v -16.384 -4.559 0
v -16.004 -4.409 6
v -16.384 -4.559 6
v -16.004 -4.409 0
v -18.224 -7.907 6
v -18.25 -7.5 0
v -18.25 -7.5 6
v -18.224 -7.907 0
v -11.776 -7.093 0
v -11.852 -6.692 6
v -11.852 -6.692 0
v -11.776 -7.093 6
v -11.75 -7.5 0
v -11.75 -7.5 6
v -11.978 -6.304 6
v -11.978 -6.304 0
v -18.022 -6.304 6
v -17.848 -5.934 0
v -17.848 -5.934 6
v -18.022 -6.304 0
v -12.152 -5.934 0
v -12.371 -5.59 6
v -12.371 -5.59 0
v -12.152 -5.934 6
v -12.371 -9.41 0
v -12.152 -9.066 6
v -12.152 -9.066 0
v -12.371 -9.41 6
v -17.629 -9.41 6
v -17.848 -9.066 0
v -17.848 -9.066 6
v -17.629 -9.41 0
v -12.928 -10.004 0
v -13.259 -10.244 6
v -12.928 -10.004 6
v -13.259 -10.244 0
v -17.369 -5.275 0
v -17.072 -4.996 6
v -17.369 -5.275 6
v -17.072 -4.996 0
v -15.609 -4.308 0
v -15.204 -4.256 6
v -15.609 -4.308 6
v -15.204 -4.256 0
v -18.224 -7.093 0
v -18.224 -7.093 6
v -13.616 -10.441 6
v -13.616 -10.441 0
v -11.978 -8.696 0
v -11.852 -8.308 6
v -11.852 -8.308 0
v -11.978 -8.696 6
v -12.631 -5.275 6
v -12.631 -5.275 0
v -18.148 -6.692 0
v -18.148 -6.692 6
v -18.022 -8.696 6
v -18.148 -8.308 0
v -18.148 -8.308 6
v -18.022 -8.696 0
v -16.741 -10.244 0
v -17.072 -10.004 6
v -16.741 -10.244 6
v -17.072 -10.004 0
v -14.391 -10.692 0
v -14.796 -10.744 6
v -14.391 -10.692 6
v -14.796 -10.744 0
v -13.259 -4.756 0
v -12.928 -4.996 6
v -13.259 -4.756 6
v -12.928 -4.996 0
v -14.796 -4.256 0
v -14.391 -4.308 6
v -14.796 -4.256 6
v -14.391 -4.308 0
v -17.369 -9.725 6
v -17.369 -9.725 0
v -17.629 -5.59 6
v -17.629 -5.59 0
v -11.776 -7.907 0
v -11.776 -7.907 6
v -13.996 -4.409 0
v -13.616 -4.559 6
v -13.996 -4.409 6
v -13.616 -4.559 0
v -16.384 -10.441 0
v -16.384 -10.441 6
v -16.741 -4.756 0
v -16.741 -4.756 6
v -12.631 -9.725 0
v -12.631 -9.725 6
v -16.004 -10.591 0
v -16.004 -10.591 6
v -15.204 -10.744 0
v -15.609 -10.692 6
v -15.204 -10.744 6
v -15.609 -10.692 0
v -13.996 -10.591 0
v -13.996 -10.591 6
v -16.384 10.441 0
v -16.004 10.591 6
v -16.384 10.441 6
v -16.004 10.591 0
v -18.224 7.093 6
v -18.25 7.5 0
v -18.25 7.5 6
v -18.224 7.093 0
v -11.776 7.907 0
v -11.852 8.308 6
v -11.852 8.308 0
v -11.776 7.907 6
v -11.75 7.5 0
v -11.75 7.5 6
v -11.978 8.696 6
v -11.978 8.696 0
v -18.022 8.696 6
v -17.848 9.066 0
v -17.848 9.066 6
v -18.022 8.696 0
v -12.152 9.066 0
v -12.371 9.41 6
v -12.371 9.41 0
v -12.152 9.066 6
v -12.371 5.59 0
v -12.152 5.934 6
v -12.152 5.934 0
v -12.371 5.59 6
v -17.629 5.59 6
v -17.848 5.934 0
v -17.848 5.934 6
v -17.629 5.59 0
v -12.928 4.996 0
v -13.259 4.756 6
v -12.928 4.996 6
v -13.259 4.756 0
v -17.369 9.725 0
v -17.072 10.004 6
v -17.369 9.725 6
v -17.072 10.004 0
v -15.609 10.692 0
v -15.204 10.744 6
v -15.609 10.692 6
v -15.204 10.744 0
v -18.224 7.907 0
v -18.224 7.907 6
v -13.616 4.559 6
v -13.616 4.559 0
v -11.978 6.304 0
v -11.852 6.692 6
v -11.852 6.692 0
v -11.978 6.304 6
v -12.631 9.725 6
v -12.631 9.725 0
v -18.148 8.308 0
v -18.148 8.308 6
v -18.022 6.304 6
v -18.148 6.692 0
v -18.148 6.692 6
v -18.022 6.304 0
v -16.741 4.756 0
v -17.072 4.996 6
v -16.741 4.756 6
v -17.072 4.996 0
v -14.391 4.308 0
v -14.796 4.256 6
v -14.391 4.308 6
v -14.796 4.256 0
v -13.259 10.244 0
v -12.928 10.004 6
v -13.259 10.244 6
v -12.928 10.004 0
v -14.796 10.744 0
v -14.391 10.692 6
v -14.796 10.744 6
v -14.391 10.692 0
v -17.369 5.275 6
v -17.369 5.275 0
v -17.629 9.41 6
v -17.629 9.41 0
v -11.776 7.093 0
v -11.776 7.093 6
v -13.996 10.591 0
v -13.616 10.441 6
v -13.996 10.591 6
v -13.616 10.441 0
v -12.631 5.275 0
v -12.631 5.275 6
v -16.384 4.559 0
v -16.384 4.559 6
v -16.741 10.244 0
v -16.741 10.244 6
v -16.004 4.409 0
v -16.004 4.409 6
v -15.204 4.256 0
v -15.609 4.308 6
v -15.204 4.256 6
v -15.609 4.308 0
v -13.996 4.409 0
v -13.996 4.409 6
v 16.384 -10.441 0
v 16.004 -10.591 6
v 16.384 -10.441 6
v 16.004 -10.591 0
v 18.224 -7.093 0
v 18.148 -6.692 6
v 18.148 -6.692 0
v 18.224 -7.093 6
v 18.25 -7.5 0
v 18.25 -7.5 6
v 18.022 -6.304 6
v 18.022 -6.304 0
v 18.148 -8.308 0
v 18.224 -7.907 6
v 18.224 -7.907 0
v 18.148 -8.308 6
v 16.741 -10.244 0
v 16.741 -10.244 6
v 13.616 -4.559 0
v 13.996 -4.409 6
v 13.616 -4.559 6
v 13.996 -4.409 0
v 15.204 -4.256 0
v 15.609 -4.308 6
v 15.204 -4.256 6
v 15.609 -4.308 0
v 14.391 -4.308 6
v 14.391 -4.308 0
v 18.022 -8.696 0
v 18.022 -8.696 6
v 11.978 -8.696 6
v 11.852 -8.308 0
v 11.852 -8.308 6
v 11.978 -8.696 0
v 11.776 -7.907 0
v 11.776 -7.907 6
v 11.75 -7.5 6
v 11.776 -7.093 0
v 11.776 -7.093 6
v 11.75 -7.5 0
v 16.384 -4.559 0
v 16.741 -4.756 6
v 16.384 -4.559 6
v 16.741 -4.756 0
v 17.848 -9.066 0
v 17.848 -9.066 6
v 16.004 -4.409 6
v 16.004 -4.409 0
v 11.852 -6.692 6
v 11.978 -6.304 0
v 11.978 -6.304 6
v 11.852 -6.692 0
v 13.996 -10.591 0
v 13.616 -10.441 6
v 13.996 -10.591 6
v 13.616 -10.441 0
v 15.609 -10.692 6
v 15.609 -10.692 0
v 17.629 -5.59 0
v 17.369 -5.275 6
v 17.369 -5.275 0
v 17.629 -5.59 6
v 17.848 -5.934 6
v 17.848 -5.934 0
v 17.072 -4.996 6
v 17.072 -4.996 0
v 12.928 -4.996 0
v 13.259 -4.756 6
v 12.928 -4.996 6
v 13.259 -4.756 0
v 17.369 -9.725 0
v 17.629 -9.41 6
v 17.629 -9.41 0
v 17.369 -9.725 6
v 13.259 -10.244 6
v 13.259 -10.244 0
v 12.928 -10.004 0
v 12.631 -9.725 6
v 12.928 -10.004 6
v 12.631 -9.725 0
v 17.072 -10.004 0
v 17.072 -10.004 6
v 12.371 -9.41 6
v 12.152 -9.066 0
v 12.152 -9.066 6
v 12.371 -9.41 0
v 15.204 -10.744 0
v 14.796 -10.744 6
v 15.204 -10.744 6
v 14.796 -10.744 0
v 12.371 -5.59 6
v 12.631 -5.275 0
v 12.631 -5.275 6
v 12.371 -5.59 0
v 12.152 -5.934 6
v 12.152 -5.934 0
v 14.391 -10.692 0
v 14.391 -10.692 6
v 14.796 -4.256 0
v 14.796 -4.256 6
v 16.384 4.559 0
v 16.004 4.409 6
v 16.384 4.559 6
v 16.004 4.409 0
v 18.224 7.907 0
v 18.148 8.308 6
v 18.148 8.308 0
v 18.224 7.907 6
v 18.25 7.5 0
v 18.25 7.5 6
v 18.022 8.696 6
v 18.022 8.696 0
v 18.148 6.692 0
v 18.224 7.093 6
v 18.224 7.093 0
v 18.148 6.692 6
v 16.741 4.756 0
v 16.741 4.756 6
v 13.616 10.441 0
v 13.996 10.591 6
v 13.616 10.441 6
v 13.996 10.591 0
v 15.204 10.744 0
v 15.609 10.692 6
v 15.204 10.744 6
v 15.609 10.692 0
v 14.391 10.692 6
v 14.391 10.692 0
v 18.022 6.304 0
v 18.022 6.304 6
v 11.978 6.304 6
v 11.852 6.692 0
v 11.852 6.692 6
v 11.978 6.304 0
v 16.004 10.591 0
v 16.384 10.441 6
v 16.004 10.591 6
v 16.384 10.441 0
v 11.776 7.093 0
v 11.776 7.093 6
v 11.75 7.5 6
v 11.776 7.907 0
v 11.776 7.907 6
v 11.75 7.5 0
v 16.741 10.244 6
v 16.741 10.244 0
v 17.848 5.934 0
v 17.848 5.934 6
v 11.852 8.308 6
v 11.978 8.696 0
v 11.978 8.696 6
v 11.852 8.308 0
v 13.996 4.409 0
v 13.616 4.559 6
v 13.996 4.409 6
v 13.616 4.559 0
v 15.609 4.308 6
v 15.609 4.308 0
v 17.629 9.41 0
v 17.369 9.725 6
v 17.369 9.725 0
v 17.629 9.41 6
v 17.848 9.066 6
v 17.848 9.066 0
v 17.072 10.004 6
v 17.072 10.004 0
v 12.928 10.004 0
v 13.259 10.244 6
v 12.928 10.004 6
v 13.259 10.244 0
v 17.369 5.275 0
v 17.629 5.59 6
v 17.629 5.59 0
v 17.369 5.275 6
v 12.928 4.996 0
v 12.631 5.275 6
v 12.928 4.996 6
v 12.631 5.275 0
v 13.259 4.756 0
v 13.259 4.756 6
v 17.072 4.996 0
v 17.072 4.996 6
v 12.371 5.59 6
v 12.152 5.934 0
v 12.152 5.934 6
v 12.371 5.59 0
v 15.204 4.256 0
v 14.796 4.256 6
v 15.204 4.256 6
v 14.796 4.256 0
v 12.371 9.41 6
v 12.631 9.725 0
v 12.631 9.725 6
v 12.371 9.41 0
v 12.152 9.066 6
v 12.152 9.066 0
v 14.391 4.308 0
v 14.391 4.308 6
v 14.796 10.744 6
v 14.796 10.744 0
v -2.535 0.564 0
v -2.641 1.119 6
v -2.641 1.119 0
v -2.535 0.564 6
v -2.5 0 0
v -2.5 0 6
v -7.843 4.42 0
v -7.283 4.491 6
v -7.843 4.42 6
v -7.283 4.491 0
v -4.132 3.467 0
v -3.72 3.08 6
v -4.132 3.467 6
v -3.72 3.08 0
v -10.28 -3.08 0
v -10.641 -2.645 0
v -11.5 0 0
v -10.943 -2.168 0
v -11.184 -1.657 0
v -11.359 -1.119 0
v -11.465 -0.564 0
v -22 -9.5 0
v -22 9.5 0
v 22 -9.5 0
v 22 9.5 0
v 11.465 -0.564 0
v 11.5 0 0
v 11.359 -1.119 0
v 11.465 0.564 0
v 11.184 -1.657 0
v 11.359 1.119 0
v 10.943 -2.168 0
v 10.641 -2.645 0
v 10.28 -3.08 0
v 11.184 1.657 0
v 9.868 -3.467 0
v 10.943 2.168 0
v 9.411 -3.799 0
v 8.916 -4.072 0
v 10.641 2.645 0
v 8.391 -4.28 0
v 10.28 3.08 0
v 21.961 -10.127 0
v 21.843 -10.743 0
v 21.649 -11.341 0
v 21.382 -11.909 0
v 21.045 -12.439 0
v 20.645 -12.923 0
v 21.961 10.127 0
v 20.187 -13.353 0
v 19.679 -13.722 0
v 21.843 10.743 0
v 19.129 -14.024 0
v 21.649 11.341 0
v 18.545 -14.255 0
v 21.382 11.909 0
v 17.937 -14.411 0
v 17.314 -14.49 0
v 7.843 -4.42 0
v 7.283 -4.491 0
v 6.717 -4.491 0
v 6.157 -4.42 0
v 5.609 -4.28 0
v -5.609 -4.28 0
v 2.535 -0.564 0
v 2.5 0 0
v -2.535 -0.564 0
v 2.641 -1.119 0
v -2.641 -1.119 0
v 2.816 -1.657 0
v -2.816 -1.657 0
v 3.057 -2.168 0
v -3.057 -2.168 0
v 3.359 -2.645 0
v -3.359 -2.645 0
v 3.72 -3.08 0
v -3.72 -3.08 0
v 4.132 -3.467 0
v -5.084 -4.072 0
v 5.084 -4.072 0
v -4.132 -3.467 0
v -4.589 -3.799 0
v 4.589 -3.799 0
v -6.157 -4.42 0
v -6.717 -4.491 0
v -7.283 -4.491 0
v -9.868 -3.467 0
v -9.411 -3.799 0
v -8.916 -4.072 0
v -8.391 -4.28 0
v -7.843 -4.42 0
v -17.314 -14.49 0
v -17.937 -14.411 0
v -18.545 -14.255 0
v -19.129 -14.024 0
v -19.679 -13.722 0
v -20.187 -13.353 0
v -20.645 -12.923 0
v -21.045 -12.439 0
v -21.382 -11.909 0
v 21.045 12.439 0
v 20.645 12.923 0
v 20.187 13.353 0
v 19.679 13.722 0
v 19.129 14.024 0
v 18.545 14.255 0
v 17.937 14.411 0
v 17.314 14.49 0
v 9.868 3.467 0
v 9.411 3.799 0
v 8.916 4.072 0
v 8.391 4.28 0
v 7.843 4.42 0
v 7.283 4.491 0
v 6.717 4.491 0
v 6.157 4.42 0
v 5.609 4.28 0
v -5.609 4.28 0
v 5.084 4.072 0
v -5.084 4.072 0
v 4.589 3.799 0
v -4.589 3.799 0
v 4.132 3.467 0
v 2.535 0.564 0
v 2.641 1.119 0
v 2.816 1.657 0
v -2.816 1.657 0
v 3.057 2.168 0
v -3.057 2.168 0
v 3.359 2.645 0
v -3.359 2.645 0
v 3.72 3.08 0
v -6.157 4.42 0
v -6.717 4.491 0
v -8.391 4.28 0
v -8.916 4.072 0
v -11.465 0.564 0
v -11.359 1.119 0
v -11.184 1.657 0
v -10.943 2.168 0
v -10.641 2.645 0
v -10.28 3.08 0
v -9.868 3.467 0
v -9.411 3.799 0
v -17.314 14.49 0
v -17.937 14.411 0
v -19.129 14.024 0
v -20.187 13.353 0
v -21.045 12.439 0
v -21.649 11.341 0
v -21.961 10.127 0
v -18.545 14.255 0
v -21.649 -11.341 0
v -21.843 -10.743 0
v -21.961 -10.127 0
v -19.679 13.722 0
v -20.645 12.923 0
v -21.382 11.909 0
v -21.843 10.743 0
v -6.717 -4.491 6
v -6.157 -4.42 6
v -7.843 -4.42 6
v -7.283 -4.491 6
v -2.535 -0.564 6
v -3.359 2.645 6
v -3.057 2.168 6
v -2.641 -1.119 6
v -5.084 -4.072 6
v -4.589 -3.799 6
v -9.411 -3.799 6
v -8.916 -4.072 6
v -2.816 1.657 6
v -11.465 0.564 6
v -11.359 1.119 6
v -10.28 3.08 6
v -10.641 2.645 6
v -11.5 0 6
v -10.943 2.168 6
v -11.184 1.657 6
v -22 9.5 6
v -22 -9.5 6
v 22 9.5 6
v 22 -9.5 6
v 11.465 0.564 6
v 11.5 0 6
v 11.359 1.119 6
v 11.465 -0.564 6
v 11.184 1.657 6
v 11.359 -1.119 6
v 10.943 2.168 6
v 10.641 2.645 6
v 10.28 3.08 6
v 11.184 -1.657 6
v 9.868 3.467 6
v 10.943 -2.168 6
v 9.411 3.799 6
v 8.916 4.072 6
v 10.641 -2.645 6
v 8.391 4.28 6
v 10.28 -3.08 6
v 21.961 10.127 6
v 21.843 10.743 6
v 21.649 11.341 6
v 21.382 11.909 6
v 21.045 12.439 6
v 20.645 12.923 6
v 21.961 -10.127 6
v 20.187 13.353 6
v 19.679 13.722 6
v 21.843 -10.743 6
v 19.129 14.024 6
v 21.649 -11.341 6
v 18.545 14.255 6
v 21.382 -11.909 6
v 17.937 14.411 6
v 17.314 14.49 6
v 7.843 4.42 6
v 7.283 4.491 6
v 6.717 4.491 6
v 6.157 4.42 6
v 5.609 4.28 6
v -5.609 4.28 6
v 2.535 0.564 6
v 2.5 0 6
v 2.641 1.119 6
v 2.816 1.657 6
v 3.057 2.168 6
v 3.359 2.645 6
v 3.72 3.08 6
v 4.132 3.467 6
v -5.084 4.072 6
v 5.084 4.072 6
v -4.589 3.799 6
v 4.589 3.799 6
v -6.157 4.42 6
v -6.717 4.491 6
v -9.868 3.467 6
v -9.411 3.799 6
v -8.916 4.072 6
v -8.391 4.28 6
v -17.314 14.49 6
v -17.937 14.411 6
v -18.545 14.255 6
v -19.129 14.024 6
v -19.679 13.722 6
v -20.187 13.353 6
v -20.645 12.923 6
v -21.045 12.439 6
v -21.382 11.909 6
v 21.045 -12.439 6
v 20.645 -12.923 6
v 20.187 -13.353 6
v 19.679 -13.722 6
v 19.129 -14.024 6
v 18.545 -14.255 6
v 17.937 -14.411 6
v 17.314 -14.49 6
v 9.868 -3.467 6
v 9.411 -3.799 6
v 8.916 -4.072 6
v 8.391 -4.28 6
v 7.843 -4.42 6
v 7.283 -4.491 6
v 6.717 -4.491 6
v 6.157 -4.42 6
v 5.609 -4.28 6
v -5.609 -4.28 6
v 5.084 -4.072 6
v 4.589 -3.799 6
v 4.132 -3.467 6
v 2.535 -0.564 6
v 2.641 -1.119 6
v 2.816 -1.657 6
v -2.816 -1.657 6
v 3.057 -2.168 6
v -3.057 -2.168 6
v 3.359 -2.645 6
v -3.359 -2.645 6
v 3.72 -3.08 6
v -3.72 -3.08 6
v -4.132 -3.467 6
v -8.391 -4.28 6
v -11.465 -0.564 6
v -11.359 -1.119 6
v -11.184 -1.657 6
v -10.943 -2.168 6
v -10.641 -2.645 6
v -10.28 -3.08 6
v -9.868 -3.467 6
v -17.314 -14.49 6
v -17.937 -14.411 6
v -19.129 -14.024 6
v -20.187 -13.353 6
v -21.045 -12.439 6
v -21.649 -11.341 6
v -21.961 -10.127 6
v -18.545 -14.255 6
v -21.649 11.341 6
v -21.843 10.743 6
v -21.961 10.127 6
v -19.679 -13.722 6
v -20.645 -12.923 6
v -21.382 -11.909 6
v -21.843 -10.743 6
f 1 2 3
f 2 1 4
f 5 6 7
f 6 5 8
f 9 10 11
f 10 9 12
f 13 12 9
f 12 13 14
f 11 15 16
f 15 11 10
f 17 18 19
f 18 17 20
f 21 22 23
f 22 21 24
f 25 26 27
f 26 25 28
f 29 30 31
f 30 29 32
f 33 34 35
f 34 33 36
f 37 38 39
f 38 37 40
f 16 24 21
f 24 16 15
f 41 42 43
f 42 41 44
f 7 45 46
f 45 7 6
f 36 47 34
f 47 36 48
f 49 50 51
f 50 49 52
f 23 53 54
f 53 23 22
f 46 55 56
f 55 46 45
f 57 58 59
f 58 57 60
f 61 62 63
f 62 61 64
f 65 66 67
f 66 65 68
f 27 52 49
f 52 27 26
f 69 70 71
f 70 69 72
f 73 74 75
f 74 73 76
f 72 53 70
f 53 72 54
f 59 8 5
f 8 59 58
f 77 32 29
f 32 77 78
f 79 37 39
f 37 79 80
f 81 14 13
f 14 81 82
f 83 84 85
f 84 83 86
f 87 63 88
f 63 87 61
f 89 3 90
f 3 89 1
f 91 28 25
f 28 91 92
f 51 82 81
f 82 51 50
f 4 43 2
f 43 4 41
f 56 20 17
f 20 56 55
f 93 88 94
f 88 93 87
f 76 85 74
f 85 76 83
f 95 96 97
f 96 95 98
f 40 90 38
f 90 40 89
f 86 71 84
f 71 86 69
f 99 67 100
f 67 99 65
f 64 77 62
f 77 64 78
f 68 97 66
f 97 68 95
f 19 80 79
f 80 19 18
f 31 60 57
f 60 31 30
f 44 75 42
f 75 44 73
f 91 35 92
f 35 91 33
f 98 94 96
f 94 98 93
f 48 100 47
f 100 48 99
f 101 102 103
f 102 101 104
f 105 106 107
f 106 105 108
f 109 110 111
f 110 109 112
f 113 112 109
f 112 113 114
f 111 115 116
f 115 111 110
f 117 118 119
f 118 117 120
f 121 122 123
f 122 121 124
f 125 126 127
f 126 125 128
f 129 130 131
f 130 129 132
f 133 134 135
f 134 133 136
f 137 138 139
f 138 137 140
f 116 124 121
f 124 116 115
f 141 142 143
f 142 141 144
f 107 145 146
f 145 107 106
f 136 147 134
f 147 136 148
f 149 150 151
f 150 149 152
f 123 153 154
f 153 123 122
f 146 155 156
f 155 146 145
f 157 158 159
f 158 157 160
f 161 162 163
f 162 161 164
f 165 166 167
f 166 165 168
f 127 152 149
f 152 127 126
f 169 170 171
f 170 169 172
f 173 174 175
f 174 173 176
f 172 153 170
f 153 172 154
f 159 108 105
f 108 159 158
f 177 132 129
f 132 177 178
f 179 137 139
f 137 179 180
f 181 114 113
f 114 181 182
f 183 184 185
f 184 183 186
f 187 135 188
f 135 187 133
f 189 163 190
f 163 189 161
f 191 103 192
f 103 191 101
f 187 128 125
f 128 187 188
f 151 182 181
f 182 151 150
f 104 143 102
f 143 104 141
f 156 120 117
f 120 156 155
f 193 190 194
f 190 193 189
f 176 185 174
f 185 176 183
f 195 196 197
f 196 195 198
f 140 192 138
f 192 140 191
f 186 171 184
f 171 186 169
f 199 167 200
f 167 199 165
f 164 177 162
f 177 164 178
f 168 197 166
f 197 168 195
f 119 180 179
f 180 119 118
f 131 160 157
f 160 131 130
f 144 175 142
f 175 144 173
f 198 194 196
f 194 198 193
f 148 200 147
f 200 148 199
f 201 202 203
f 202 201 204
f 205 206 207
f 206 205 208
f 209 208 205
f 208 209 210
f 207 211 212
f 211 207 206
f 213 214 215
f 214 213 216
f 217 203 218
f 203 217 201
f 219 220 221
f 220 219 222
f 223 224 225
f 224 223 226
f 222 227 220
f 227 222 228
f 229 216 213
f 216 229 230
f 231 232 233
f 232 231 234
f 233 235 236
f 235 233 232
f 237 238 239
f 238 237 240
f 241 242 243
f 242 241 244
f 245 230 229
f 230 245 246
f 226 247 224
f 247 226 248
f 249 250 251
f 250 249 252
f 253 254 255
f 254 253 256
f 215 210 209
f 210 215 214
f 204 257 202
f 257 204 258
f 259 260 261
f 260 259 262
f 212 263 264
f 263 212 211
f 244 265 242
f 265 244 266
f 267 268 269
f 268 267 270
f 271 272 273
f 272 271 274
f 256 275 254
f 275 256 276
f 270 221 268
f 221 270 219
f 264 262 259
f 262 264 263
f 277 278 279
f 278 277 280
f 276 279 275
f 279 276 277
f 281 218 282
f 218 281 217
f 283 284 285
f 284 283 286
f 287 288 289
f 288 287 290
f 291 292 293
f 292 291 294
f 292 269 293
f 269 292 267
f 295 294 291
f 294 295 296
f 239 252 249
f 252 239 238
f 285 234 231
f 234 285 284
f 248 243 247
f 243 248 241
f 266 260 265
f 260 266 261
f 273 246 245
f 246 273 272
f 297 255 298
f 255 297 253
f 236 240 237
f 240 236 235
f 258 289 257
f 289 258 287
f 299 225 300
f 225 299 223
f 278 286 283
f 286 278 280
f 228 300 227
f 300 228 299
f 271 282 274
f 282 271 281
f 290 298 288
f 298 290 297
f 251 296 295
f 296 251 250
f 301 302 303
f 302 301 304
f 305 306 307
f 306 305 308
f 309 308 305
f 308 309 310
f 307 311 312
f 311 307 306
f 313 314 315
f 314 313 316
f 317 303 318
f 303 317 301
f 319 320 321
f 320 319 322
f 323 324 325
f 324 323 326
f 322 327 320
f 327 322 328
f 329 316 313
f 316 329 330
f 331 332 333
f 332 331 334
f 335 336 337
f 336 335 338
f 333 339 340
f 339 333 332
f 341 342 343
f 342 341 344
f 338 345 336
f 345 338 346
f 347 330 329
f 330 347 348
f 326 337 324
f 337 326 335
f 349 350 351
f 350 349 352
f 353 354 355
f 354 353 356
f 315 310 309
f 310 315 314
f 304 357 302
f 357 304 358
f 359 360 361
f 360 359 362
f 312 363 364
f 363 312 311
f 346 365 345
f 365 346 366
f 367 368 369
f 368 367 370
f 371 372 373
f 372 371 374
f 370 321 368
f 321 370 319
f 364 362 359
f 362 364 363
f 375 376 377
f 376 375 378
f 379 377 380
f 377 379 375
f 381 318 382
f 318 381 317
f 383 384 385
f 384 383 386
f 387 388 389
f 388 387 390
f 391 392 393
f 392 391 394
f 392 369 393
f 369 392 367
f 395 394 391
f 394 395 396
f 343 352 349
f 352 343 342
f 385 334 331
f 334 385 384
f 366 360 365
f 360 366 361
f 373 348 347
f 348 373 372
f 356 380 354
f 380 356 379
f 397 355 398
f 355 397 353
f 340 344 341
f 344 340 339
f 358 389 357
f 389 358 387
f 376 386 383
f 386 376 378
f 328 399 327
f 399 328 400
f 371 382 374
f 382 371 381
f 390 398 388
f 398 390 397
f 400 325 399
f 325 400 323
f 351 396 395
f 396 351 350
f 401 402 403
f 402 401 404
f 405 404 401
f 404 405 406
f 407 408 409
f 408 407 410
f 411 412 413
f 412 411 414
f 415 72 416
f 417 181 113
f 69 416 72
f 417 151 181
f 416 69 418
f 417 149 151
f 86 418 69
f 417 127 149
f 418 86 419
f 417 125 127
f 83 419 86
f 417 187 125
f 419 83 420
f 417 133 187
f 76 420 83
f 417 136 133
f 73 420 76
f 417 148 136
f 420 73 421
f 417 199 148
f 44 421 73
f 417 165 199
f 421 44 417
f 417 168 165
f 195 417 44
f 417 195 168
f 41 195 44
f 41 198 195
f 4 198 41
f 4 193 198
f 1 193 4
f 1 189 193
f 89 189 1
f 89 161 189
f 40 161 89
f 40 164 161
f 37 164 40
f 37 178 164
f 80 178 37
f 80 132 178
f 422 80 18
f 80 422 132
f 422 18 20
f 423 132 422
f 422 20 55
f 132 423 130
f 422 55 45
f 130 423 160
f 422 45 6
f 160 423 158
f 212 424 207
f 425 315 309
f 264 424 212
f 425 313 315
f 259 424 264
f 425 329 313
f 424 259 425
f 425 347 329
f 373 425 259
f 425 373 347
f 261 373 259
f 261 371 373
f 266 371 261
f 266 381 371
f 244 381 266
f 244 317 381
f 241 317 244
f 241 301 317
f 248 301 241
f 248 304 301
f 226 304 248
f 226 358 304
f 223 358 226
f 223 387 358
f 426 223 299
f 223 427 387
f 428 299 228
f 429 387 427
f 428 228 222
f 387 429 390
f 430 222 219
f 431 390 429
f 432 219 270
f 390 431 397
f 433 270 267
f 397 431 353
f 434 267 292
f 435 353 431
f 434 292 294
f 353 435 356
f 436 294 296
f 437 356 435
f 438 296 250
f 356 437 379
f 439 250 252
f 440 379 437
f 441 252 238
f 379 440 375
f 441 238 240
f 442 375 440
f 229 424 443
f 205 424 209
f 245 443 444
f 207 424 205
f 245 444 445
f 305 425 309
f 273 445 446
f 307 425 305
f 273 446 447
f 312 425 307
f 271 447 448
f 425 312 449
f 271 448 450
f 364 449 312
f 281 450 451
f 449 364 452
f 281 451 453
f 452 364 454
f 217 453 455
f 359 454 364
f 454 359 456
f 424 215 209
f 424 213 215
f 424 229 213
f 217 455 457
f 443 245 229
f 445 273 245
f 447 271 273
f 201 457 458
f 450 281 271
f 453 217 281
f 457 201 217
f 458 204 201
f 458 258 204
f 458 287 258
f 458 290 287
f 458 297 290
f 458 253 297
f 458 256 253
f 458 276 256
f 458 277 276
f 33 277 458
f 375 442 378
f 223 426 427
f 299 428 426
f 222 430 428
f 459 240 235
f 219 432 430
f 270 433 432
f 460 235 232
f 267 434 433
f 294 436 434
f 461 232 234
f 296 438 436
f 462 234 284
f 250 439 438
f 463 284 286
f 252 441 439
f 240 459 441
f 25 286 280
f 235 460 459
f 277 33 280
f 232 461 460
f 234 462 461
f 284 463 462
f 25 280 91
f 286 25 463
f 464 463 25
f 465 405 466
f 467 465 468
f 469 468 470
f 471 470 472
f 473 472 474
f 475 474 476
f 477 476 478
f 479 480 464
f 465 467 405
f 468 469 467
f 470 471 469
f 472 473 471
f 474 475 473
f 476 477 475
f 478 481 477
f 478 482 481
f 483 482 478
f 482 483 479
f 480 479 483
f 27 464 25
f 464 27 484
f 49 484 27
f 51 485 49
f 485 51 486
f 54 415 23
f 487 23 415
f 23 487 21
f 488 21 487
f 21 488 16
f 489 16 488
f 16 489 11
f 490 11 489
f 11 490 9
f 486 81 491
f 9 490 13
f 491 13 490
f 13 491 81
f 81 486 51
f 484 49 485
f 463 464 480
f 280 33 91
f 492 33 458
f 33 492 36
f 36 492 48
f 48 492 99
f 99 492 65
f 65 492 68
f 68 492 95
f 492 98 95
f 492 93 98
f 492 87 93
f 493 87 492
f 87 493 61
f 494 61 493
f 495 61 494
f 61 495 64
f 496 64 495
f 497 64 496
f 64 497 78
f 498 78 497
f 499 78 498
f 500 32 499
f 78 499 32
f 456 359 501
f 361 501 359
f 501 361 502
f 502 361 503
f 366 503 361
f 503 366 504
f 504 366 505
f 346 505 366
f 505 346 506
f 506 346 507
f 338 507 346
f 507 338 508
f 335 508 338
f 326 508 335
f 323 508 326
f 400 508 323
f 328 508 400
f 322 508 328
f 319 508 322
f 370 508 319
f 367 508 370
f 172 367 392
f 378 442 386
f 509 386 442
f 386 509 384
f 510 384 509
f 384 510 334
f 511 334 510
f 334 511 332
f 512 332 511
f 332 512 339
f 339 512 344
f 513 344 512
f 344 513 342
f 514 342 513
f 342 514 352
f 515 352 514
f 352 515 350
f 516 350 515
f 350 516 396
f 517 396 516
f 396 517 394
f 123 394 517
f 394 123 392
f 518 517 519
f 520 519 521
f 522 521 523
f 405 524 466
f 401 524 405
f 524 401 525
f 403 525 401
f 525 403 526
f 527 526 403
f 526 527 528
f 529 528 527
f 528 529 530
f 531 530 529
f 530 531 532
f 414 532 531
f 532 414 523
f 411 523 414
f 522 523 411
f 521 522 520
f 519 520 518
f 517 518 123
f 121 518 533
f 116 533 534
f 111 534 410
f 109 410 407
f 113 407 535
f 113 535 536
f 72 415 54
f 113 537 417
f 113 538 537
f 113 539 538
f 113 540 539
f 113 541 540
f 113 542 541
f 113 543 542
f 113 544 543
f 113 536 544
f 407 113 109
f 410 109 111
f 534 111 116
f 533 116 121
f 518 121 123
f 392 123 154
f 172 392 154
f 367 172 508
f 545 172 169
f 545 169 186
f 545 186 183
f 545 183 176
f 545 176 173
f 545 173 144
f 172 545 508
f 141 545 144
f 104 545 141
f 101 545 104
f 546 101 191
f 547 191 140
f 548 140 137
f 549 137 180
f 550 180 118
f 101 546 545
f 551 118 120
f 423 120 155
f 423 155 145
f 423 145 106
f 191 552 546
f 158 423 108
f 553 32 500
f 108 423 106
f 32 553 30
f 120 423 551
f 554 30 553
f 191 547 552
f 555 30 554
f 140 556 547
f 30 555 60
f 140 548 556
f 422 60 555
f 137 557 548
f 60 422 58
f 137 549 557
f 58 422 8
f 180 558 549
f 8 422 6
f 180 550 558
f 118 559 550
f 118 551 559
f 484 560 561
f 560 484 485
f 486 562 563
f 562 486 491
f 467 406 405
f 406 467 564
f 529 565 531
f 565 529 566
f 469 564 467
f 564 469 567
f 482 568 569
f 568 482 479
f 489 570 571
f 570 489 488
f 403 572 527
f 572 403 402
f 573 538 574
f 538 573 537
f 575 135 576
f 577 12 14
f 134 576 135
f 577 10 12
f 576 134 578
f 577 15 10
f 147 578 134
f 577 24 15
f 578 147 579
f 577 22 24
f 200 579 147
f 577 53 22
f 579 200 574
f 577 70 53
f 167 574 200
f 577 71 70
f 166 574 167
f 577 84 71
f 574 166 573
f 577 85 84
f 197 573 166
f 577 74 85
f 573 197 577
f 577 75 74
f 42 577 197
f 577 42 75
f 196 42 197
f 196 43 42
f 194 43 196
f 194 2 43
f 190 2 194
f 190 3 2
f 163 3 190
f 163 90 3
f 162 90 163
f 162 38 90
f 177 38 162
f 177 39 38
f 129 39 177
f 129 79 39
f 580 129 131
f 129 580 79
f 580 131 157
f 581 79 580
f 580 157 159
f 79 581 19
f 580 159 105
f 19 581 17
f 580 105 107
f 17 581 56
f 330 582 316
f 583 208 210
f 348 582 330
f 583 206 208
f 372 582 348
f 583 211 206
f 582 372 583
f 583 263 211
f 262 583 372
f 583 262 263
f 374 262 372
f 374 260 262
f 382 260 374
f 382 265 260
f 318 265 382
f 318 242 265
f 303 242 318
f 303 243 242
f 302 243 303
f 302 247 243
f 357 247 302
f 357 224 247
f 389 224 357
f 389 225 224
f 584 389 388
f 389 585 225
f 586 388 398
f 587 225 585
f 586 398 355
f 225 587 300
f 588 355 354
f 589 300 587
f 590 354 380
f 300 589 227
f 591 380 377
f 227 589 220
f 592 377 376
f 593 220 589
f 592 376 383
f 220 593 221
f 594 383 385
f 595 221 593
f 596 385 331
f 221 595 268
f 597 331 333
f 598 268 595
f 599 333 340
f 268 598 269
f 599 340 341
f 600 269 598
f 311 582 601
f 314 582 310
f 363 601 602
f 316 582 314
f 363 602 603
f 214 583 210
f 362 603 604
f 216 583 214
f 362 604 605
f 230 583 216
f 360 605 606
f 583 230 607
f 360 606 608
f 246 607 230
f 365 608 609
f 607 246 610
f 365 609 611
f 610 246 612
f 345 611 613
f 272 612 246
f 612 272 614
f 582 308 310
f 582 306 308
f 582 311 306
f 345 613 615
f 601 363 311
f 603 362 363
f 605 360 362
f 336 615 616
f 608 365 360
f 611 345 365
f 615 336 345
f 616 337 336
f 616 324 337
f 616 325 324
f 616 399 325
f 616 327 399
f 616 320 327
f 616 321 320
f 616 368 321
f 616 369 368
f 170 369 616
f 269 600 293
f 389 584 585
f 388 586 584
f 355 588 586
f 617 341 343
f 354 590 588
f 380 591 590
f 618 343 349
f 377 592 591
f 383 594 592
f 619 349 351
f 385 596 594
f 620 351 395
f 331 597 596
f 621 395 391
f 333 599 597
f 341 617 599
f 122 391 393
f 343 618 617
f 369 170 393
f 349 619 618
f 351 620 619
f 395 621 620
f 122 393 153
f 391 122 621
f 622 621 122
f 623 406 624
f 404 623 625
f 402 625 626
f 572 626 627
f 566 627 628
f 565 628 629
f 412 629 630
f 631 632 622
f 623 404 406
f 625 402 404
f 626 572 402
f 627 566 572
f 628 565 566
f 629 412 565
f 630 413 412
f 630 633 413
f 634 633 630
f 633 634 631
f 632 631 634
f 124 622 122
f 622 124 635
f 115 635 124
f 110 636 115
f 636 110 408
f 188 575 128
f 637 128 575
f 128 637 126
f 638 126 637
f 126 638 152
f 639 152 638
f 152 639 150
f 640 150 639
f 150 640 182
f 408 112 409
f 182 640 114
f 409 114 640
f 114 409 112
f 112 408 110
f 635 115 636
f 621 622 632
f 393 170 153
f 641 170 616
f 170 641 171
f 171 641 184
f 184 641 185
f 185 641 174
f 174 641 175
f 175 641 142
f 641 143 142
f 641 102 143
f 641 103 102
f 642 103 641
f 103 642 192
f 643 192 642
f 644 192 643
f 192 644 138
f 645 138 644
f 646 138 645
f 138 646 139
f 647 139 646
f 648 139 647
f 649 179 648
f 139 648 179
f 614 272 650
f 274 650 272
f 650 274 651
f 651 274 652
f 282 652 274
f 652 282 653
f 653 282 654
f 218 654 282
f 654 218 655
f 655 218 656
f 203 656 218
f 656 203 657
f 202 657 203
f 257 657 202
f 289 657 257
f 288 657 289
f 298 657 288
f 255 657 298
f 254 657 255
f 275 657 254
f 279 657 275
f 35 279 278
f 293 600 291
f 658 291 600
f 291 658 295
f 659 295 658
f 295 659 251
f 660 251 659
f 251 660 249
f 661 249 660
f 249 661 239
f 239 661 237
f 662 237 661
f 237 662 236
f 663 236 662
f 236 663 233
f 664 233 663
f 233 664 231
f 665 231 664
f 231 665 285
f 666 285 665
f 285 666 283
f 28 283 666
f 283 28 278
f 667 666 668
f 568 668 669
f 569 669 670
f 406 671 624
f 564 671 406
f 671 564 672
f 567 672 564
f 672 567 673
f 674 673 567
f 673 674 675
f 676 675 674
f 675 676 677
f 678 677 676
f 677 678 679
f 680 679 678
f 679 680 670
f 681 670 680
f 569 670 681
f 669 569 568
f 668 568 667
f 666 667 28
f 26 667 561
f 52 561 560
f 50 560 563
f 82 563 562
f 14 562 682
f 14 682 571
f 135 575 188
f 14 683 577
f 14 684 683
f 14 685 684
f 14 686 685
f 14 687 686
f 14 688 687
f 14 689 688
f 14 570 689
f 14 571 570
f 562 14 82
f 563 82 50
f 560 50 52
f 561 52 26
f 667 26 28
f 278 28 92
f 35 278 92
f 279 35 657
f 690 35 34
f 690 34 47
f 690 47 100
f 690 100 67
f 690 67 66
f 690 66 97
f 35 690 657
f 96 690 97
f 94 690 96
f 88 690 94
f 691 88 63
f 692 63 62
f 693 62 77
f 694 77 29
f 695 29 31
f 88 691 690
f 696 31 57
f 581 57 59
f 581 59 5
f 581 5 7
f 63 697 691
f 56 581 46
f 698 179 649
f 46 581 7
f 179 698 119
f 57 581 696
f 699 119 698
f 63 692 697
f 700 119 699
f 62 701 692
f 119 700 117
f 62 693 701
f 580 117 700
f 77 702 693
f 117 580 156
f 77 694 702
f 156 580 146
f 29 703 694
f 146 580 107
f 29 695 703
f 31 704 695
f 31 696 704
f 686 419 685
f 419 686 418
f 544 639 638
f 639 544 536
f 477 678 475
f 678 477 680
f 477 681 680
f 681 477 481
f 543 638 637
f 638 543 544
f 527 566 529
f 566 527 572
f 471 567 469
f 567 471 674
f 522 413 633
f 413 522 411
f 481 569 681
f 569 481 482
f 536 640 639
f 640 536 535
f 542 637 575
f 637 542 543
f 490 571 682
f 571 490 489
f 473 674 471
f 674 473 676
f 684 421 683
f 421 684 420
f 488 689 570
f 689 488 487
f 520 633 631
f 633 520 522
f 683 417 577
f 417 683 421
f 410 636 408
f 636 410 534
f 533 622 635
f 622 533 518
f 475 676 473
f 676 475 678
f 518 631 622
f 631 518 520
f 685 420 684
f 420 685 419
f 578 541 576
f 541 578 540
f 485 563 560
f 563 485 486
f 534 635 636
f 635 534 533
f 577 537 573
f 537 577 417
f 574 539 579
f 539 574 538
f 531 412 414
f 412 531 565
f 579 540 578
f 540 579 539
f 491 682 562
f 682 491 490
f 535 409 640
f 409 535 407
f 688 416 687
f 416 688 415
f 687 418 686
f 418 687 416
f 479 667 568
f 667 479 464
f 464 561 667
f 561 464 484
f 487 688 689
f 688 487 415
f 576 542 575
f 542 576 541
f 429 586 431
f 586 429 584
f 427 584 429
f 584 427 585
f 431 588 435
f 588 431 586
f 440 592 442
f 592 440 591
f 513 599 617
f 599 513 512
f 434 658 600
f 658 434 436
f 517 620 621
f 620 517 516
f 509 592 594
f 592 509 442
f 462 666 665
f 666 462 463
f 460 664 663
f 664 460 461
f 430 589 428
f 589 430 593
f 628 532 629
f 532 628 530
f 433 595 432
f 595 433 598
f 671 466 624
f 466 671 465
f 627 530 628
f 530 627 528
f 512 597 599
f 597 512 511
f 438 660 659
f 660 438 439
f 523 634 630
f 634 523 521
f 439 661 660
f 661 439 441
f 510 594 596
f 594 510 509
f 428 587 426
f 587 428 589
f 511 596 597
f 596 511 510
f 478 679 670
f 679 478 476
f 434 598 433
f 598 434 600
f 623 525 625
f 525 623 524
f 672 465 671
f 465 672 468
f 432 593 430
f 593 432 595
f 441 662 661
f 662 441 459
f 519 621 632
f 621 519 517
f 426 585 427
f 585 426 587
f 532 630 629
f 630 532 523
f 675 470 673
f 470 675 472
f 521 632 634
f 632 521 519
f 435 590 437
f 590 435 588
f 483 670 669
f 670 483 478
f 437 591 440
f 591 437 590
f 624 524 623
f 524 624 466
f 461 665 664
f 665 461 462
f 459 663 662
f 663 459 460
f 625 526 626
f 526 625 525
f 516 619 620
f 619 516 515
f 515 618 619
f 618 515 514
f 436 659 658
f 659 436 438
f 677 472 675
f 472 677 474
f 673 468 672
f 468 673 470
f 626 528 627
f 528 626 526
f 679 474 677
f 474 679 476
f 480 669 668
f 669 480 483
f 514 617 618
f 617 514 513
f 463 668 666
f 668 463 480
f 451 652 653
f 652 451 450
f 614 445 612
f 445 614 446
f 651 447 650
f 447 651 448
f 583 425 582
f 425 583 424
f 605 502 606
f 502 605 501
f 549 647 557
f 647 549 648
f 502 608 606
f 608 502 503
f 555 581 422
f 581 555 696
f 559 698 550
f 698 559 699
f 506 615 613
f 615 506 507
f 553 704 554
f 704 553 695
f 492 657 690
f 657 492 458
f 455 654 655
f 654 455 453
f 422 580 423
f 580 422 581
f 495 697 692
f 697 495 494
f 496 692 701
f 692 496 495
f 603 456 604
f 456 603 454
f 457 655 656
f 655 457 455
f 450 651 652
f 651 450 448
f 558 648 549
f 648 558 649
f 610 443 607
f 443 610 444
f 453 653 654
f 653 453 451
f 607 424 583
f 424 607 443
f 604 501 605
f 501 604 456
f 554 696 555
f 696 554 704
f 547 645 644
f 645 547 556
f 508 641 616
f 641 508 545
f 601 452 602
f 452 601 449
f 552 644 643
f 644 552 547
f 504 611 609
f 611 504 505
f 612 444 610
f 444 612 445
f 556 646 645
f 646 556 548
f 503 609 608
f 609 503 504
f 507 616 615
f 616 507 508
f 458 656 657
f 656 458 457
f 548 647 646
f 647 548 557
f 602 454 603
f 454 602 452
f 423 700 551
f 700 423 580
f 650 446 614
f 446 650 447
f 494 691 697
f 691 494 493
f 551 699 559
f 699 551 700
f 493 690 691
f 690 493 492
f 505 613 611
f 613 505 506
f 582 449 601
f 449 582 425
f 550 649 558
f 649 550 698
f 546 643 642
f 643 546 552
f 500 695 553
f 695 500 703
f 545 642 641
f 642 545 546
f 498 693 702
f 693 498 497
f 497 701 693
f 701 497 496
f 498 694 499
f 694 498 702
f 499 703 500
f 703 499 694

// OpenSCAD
$fn = 50;


difference() {
	union() {
		hull() {
			translate(v = [-17.0000000000, 9.5000000000, 0]) {
				cylinder(h = 6, r = 5);
			}
			translate(v = [17.0000000000, 9.5000000000, 0]) {
				cylinder(h = 6, r = 5);
			}
			translate(v = [-17.0000000000, -9.5000000000, 0]) {
				cylinder(h = 6, r = 5);
			}
			translate(v = [17.0000000000, -9.5000000000, 0]) {
				cylinder(h = 6, r = 5);
			}
		}
	}
	union() {
		#translate(v = [-15.0000000000, -7.5000000000, -100.0000000000]) {
			cylinder(h = 200, r = 3.2500000000);
		}
		#translate(v = [-15.0000000000, 7.5000000000, -100.0000000000]) {
			cylinder(h = 200, r = 3.2500000000);
		}
		#translate(v = [15.0000000000, -7.5000000000, -100.0000000000]) {
			cylinder(h = 200, r = 3.2500000000);
		}
		#translate(v = [15.0000000000, 7.5000000000, -100.0000000000]) {
			cylinder(h = 200, r = 3.2500000000);
		}
		#translate(v = [-7.0000000000, 0, 0]) {
			cylinder(h = 6, r = 4.5000000000);
		}
		#translate(v = [7.0000000000, 0, 0]) {
			cylinder(h = 6, r = 4.5000000000);
		}
	}
}
